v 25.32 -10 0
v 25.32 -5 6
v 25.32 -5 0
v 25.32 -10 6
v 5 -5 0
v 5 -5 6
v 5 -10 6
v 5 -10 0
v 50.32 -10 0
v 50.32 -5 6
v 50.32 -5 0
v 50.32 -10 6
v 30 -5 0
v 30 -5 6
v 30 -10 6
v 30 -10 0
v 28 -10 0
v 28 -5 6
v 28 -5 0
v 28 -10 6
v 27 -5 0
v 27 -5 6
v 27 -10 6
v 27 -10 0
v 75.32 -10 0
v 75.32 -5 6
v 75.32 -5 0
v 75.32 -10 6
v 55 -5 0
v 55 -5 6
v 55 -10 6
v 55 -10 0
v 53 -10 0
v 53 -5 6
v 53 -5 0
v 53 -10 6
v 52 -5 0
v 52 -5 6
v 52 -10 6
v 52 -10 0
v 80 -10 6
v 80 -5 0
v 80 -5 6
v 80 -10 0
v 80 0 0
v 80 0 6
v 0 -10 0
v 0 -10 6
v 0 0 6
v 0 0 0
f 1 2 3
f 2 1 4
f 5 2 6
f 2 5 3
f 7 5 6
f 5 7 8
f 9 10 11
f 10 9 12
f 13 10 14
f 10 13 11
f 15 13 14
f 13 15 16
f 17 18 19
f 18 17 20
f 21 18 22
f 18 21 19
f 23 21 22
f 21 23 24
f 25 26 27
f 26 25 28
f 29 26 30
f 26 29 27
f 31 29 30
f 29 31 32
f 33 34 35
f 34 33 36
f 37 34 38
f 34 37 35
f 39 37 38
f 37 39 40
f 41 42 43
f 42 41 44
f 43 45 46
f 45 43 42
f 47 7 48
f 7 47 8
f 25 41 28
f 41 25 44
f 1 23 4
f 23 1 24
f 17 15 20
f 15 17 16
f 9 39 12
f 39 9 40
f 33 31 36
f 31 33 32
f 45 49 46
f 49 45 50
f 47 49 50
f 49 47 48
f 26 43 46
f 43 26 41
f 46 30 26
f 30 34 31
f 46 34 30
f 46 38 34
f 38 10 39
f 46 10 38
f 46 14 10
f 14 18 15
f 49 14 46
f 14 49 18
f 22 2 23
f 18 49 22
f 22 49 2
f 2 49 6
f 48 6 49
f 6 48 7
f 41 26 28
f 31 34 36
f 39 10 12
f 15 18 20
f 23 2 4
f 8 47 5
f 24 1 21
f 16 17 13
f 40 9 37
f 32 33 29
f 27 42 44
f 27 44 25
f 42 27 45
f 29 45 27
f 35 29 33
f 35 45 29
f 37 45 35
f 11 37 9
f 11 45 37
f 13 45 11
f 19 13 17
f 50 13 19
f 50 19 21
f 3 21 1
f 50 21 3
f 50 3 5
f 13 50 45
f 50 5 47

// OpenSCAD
rotate([90,0]) difference(){
  cube([80,6,10]);
  for(x=[0:3])
  {
    translate([5+25*x,-.01,5])
      cube([25.4*.8,20.02,99]);
    if(x>0&&x<3)
      translate([2+25*x,-.01,5])
      cube([1,20.02,99]);
  }
}
